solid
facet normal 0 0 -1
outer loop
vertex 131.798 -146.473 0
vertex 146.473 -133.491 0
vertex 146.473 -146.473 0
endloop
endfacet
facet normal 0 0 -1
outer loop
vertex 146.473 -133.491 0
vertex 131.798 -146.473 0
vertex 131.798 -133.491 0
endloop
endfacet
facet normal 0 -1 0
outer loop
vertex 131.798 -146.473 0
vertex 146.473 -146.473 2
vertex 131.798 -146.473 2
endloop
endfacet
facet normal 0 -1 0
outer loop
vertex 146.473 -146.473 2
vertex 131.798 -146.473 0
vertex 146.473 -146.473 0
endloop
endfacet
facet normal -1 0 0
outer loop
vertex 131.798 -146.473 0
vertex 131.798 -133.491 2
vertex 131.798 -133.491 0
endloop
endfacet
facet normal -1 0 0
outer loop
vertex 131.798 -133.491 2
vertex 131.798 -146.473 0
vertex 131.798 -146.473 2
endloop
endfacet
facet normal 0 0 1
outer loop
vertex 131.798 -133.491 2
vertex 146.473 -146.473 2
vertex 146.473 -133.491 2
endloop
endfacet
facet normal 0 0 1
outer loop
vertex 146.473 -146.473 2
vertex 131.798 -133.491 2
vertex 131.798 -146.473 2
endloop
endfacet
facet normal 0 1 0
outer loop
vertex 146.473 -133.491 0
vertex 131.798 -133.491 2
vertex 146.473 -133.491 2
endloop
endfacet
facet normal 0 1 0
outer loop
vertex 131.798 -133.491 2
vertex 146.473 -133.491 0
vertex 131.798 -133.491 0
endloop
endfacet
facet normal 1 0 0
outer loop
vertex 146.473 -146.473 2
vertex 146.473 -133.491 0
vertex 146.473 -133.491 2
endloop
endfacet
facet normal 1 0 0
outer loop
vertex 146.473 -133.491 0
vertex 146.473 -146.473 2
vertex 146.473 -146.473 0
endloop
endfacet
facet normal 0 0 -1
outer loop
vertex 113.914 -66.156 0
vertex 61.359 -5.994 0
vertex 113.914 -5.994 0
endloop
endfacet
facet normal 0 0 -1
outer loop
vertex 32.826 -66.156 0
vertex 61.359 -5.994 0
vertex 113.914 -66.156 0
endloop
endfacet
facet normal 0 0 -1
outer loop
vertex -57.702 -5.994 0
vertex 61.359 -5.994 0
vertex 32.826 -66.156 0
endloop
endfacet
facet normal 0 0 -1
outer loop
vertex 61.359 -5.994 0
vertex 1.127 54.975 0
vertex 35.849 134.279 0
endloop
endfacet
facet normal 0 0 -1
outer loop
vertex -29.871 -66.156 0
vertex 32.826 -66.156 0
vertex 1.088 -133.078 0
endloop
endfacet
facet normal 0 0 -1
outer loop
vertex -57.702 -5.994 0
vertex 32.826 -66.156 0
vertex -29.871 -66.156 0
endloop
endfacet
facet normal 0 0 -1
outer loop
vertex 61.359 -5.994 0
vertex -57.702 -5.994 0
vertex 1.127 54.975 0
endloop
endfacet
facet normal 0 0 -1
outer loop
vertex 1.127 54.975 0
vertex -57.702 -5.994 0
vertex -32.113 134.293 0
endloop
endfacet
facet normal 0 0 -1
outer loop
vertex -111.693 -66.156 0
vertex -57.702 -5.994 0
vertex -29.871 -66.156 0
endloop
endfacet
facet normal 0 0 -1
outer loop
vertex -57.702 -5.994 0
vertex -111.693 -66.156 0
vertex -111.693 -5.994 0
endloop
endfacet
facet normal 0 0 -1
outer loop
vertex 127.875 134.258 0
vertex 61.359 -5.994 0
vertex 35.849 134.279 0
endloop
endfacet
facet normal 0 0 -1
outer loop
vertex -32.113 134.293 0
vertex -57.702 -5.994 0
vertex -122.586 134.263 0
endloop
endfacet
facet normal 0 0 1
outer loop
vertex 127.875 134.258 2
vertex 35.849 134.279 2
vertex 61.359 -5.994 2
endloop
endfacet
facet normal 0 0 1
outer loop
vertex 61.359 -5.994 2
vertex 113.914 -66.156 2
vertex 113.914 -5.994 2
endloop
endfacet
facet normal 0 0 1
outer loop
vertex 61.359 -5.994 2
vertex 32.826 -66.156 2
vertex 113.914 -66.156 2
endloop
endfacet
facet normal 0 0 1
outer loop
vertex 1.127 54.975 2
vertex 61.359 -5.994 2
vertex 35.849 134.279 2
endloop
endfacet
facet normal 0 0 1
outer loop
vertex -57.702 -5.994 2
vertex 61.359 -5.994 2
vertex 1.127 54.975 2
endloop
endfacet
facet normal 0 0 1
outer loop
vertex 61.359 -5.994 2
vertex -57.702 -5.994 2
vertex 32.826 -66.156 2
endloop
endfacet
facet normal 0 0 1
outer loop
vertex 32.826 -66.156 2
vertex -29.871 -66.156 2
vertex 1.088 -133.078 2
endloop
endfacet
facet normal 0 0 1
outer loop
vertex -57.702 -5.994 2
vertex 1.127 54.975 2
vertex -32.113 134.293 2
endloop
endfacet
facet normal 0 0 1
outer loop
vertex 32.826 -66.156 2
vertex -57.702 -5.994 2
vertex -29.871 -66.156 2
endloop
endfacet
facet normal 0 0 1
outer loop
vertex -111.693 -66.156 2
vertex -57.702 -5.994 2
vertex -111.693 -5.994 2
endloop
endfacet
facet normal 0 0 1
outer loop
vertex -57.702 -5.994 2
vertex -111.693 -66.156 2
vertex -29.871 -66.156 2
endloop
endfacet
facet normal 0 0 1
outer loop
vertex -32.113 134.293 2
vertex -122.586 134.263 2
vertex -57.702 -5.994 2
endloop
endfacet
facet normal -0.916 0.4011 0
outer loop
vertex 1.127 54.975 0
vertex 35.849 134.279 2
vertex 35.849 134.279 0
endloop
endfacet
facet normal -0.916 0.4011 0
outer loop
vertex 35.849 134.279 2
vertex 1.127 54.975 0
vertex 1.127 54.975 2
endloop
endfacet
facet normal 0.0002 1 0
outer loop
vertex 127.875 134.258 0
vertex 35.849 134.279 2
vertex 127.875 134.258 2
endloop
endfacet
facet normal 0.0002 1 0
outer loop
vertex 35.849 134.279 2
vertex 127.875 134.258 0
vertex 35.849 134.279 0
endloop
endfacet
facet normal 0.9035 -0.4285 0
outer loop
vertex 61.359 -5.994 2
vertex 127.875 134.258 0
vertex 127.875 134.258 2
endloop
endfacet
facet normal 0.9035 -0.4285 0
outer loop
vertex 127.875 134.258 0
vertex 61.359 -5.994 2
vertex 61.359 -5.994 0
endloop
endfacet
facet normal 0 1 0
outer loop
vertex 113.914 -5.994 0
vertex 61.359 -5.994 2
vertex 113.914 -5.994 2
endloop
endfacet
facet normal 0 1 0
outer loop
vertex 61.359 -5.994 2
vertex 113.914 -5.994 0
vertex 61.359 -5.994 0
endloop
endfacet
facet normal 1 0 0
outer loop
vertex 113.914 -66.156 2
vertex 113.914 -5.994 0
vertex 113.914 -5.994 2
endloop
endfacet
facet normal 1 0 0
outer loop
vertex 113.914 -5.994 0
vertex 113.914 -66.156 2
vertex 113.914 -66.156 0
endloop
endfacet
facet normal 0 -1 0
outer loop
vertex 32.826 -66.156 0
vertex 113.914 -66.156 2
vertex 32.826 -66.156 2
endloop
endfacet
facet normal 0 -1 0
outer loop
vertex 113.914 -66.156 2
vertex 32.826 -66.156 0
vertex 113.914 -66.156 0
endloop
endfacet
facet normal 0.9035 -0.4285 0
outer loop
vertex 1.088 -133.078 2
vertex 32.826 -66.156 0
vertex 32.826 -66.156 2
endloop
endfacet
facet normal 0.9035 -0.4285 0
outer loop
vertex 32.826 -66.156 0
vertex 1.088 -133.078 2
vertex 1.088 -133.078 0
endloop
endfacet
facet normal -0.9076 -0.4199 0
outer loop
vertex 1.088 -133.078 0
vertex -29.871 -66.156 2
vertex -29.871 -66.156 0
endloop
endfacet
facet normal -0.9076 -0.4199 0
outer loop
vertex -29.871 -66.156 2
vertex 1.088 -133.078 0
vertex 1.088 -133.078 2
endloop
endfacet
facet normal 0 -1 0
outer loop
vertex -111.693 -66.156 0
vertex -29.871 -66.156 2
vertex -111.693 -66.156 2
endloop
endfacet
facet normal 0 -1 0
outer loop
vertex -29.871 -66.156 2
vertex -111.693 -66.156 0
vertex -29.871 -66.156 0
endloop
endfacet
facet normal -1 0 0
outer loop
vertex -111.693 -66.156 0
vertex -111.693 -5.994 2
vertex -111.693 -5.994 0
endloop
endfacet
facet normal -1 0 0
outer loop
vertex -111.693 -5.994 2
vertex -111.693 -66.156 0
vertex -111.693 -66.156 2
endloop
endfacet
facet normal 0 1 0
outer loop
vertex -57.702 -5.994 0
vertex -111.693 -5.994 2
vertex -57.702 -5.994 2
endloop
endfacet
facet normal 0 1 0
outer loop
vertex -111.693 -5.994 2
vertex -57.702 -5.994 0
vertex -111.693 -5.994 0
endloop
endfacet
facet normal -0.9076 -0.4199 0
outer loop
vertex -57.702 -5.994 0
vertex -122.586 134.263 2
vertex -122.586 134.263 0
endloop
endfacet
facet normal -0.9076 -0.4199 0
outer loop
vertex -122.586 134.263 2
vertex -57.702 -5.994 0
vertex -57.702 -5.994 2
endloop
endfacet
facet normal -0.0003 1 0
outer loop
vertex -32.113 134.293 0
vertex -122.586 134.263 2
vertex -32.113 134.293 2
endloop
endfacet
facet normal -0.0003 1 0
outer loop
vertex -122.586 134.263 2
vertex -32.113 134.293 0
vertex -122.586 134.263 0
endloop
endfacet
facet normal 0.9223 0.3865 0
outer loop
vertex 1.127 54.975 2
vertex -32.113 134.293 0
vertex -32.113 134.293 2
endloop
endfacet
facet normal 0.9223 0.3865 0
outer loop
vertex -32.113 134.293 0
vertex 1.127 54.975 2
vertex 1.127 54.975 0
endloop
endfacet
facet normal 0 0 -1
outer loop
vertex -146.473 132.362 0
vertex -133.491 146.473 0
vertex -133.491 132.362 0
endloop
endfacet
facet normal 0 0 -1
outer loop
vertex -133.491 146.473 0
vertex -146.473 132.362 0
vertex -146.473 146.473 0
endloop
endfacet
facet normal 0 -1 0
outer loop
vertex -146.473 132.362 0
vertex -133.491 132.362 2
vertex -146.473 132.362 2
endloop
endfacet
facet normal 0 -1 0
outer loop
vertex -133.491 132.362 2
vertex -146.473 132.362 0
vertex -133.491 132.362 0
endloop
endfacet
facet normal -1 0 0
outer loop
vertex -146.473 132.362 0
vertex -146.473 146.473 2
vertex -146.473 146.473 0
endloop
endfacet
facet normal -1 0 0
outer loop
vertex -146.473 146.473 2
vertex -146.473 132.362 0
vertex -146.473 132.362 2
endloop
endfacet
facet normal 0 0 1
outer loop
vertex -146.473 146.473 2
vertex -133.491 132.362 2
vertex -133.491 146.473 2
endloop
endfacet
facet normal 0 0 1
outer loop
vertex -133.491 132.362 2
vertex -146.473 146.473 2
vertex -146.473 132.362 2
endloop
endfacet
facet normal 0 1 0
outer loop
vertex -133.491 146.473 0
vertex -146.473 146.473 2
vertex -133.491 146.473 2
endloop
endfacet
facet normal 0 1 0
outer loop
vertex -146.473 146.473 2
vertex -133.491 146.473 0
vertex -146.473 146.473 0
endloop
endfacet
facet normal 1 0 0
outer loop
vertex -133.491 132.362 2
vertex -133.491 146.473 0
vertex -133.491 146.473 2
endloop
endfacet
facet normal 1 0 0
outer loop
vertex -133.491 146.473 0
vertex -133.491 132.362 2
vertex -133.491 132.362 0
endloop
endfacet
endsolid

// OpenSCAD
// Module names are of the form poly_<inkscape-path-id>().
// As a result you can associate a polygon in this OpenSCAD program with the
//  corresponding SVG element in the Inkscape document by looking for 
//  the XML element with the attribute id="inkscape-path-id".

// Paths have their own variables so they can be imported and used 
//  in polygon(points) structures in other programs.
// The NN_points is the list of all polygon XY vertices. 
// There may be an NN_paths variable as well. If it exists then it 
//  defines the nested paths. Both must be used in the 
//  polygon(points, paths) variant of the command.

profile_scale = 25.4/90; //made in inkscape in mm

// helper functions to determine the X,Y dimensions of the profiles
function min_x(shape_points) = min([ for (x = shape_points) min(x[0])]);
function max_x(shape_points) = max([ for (x = shape_points) max(x[0])]);
function min_y(shape_points) = min([ for (x = shape_points) min(x[1])]);
function max_y(shape_points) = max([ for (x = shape_points) max(x[1])]);

height = 2;
width = 1.0;


rect1031_0_points = [[467.000000,472.999998],[519.000000,472.999998],[519.000000,518.999998],[467.000000,518.999998],[467.000000,472.999998]];

module poly_rect1031(h, w, res=4)  {
  scale([profile_scale, -profile_scale, 1])
  union()  {
    linear_extrude(height=h)
      polygon(rect1031_0_points);
  }
}

path45872_0_points = [[-113.787110,-475.841799],[-434.361328,-475.734377],[-204.457030,21.238278],[-395.763672,21.238278],[-395.763672,234.410158],[-105.841800,234.410158],[3.853520,471.535158],[116.312500,234.410158],[403.630860,234.410158],[403.630860,21.238278],[217.412110,21.238278],[453.101560,-475.718752],[127.023440,-475.791018],[3.992190,-194.794922],[-113.787110,-475.841799],[-113.787110,-475.841799]];

module poly_path45872(h, w, res=4)  {
  scale([profile_scale, -profile_scale, 1])
  union()  {
    linear_extrude(height=h)
      polygon(path45872_0_points);
  }
}

rect1033_0_points = [[-519.000000,-518.999998],[-473.000000,-518.999998],[-473.000000,-468.999998],[-519.000000,-468.999998],[-519.000000,-518.999998]];

module poly_rect1033(h, w, res=4)  {
  scale([profile_scale, -profile_scale, 1])
  union()  {
    linear_extrude(height=h)
      polygon(rect1033_0_points);
  }
}

// The shapes
poly_rect1031(height, width);
poly_path45872(height, width);
poly_rect1033(height, width);
